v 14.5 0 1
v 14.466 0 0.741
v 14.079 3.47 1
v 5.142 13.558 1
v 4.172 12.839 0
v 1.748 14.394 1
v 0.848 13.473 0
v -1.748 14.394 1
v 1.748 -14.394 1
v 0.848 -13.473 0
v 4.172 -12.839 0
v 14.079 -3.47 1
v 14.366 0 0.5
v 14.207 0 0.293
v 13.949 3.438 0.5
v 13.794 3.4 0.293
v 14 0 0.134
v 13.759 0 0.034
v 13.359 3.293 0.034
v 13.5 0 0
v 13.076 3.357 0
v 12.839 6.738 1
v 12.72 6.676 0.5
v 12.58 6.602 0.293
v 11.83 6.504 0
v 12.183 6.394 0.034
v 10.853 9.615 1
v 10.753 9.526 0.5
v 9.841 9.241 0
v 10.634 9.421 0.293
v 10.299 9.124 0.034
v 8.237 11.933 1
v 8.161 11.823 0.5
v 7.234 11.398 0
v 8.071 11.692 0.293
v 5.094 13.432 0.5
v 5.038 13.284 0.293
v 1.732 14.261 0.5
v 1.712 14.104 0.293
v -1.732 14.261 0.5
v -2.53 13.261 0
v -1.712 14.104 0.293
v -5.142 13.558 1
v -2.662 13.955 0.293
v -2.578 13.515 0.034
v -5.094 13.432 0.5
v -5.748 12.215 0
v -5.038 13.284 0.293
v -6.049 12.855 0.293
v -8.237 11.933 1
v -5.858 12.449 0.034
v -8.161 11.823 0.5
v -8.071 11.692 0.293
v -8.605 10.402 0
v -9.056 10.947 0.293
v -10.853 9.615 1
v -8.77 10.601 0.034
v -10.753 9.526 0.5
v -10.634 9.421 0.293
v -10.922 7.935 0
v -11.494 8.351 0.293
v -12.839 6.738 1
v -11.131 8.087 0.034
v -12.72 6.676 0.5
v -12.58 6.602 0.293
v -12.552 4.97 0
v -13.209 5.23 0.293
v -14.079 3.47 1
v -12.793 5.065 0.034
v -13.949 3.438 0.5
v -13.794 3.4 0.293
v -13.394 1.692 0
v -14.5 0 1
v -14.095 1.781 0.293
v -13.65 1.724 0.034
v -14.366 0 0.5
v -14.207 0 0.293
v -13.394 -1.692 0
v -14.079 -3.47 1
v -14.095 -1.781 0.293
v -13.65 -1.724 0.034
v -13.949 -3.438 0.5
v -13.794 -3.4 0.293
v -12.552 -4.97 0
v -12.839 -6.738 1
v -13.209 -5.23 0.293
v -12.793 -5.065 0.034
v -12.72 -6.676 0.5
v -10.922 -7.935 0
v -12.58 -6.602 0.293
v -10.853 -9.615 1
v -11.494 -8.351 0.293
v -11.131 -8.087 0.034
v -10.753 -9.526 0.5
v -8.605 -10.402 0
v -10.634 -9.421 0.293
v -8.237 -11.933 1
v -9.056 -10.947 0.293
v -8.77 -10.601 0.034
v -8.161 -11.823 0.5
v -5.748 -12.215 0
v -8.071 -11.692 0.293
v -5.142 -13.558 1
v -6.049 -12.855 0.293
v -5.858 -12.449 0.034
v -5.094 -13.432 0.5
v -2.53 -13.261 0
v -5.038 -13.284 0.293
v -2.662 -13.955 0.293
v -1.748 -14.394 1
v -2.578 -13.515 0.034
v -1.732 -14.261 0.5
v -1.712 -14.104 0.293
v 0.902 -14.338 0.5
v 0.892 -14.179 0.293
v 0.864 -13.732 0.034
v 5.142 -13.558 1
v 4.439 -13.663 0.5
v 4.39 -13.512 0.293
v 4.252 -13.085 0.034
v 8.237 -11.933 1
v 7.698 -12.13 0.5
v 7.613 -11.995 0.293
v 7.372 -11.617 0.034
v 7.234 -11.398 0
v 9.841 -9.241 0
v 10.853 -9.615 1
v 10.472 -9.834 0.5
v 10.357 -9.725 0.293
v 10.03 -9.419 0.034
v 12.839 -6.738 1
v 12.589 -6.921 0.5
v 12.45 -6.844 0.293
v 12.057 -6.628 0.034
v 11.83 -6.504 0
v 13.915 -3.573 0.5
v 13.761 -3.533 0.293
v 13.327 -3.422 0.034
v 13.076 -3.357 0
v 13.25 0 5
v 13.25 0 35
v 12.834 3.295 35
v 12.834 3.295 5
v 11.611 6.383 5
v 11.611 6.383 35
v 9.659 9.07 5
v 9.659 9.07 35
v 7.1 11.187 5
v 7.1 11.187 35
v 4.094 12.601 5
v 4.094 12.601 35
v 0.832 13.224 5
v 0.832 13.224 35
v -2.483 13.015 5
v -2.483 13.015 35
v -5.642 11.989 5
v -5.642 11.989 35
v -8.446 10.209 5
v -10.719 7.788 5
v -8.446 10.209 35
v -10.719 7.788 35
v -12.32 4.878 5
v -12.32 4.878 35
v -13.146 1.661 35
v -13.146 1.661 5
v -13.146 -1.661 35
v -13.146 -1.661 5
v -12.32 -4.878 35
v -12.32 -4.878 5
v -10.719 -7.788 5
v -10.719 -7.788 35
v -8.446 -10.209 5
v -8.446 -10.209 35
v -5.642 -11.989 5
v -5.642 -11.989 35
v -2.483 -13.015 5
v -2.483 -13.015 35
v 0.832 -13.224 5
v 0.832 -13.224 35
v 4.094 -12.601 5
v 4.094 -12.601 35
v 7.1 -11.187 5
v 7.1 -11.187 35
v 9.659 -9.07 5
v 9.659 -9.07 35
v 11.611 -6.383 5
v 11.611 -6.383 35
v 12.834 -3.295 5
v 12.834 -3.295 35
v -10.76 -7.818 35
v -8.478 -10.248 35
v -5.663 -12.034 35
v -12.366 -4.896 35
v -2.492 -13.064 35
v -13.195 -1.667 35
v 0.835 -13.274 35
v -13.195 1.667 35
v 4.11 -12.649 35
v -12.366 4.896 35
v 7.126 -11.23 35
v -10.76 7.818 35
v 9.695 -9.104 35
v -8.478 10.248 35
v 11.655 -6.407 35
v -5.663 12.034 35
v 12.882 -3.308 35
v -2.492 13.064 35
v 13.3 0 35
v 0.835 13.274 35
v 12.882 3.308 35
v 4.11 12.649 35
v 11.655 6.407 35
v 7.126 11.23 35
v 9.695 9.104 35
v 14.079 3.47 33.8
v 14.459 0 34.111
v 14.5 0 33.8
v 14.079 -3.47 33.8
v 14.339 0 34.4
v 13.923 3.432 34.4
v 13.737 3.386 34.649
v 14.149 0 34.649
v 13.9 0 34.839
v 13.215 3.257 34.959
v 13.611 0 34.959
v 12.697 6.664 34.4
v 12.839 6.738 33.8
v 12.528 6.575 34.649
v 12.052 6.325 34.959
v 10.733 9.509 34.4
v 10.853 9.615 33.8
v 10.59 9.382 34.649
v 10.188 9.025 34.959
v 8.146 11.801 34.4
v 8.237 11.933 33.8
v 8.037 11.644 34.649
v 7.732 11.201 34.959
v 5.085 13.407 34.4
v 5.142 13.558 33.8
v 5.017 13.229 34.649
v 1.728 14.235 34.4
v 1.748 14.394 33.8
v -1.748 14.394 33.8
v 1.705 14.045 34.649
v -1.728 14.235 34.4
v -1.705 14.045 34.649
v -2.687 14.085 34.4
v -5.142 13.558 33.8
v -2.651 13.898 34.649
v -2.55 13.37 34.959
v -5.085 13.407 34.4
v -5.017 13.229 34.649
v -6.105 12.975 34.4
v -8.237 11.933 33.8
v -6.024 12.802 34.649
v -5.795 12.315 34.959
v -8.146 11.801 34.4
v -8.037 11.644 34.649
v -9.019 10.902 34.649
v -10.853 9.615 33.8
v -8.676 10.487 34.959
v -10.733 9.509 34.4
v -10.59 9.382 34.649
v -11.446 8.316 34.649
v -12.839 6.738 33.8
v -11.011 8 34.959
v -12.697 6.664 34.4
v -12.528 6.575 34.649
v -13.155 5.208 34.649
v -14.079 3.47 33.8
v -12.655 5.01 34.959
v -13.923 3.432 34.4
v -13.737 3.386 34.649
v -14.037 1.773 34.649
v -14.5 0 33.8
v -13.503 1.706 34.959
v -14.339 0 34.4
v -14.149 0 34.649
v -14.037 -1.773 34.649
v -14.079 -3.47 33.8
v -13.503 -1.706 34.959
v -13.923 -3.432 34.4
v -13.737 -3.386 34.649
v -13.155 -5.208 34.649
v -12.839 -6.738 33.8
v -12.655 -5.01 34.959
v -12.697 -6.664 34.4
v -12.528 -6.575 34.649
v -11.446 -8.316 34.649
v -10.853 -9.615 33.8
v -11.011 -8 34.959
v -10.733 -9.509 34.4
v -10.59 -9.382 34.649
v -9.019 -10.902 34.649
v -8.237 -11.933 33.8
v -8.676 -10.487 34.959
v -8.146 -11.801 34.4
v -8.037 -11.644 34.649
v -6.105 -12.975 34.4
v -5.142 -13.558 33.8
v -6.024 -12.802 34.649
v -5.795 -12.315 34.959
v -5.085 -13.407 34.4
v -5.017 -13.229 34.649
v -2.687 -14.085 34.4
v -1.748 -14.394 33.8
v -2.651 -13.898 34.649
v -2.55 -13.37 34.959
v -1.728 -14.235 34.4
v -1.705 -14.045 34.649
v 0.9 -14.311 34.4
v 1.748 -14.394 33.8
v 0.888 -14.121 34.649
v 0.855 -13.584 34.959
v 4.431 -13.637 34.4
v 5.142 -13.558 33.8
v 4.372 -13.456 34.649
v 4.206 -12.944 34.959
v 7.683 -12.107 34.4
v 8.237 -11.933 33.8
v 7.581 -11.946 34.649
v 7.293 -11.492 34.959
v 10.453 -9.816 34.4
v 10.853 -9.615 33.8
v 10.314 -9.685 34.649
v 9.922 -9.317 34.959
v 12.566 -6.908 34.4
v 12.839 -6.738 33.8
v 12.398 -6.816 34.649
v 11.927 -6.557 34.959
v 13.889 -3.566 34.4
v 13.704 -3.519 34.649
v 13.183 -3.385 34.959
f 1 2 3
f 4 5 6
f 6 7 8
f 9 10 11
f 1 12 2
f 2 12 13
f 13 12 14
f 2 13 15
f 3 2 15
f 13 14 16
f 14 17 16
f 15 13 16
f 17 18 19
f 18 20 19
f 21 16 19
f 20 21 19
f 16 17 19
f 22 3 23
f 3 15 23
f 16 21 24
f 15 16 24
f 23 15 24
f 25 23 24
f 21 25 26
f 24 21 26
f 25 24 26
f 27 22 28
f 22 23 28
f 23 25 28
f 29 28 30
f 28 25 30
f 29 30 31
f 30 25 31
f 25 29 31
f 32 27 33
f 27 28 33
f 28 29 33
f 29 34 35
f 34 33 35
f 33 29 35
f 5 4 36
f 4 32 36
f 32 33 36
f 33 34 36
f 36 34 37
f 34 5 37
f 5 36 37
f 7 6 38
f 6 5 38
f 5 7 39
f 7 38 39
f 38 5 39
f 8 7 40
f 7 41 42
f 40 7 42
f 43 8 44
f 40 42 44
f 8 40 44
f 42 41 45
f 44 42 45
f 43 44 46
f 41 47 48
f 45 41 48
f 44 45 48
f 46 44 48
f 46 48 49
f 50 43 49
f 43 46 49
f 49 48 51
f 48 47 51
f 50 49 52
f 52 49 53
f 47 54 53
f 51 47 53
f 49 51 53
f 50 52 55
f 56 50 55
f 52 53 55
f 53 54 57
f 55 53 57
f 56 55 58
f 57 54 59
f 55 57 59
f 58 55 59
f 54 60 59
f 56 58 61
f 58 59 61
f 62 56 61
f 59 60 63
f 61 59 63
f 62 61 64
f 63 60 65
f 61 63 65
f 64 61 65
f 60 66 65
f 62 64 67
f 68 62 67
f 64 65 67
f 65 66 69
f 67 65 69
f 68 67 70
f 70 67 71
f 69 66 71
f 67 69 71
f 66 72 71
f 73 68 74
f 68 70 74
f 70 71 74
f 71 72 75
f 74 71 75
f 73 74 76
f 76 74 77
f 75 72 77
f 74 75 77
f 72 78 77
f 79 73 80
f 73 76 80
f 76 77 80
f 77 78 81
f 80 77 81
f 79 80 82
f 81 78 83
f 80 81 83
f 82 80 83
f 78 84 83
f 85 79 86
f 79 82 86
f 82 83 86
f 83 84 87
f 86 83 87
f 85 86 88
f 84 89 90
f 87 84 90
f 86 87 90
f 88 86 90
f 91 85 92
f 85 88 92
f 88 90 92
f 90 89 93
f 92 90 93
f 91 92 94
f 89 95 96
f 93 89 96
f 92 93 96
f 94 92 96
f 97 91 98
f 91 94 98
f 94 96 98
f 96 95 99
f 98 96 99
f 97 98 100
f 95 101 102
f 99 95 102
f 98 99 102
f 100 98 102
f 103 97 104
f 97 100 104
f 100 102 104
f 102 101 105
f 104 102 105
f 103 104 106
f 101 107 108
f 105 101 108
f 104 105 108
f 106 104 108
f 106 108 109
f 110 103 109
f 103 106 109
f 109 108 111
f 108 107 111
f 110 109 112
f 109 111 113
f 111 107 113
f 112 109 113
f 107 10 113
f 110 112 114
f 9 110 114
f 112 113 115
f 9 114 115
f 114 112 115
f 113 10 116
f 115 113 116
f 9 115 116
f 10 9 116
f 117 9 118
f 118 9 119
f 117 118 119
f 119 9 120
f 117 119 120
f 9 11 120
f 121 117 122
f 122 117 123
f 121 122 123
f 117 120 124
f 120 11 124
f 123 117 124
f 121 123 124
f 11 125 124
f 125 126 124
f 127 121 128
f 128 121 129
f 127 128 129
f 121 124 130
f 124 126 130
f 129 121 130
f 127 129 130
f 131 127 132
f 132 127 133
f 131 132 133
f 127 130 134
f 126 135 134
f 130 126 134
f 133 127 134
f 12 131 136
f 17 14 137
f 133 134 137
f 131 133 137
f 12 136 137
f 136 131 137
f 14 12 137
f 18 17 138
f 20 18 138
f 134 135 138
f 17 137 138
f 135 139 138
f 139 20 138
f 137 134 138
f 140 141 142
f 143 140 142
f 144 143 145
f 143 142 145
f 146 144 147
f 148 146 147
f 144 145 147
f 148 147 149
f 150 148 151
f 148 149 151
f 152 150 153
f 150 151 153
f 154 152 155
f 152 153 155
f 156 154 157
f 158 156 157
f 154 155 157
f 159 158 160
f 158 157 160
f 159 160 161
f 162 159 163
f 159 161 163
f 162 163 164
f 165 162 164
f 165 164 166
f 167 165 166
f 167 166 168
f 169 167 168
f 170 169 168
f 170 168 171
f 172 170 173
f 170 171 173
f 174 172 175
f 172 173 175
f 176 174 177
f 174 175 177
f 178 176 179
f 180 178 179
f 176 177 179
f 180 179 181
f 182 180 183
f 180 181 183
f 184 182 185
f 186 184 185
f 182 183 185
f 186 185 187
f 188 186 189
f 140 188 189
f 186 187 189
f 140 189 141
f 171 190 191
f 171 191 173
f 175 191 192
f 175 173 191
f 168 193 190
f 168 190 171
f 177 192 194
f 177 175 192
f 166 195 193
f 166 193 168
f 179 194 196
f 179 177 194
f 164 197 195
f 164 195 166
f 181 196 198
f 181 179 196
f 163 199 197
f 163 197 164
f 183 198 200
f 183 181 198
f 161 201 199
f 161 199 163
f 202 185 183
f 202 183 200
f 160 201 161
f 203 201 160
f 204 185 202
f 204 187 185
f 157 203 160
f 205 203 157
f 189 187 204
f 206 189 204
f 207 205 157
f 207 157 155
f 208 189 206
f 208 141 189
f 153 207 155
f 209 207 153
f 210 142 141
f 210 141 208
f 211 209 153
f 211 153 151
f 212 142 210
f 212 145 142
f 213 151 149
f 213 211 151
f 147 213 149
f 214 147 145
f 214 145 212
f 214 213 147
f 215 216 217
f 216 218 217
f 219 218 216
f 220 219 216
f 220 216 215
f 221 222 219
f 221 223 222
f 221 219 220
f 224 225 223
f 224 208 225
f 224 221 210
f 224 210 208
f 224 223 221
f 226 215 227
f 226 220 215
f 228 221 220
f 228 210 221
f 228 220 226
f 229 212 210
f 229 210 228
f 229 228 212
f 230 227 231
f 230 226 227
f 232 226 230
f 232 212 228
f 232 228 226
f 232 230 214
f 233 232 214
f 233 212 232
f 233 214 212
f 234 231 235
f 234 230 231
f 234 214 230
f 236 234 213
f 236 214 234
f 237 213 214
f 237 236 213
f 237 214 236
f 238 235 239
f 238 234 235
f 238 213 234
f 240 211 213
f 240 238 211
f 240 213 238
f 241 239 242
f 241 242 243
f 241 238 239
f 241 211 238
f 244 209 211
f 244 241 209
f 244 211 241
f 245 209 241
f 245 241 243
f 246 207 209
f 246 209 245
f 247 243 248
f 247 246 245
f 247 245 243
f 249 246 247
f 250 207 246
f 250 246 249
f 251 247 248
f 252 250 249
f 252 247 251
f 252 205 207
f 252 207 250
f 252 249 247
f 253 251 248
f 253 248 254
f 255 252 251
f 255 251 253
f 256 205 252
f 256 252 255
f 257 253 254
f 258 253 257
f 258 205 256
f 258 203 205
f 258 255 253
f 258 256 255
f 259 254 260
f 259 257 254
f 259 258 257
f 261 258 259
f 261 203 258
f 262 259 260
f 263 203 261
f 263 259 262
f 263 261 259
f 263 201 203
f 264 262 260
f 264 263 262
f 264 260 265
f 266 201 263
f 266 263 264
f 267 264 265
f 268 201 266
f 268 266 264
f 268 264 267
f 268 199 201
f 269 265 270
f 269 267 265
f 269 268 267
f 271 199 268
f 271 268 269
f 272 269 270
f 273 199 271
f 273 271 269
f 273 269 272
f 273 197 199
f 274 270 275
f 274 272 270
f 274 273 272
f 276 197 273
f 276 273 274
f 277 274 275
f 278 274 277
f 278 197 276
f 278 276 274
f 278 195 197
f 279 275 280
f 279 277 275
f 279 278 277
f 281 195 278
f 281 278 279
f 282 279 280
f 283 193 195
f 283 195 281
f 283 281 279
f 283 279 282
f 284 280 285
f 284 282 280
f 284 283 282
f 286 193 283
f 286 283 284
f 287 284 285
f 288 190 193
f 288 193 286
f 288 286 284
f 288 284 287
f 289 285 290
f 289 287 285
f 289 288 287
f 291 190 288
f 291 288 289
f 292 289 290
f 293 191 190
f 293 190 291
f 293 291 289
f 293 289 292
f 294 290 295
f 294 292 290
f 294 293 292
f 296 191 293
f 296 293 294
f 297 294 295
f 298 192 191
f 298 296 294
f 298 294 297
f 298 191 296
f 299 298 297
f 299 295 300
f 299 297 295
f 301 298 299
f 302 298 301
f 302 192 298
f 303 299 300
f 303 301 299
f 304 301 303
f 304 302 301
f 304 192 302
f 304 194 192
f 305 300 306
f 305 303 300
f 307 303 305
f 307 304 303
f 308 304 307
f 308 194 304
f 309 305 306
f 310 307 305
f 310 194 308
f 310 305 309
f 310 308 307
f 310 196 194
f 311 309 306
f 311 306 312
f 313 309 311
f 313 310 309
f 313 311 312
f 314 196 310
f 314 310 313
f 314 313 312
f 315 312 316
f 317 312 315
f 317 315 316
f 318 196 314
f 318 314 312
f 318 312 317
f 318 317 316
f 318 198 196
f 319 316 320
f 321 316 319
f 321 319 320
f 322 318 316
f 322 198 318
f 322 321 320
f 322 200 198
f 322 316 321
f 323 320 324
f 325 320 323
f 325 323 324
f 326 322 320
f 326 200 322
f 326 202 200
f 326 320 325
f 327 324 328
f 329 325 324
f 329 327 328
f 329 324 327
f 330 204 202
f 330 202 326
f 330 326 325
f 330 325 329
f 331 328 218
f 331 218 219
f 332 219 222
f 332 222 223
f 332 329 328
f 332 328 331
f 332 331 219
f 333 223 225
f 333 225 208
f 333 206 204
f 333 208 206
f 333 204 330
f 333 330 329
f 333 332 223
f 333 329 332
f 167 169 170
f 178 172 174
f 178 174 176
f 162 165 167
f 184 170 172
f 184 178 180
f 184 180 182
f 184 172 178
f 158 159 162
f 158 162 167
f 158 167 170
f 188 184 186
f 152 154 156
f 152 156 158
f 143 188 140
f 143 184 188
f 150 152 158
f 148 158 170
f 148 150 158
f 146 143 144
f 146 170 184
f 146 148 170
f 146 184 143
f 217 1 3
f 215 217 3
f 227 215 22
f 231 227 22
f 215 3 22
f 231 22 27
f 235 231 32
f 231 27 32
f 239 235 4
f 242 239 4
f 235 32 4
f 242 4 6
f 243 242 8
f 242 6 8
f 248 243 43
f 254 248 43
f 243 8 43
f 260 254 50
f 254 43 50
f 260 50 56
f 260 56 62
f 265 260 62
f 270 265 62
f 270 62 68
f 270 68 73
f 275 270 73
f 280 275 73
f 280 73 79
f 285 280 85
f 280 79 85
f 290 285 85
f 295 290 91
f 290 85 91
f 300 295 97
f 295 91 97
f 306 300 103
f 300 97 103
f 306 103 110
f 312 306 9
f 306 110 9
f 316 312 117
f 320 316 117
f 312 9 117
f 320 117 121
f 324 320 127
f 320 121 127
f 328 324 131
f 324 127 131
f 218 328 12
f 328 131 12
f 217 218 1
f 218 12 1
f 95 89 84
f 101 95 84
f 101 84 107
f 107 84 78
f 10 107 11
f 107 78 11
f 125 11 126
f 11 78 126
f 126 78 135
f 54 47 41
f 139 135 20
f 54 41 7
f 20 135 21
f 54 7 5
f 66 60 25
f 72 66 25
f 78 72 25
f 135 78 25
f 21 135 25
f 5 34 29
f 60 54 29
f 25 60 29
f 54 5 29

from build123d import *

# Parameters (mm, degrees)
SKETCH_R     = 14.5
PAD_DEPTH    = 35
SKETCH001_R  = 13.25
POCKET_DEPTH = 30
FILLET_R     = 1
FILLET001_R  = 1.2


with BuildPart() as part:
    # Sketch → Pad (new body)
    with BuildSketch(Plane.XY):
        Circle(SKETCH_R)
    extrude(amount=PAD_DEPTH)

    # Sketch001 (on Face3 of Pad) → Pocket (cut)
    with BuildSketch(Plane.XY.offset(35)):
        Circle(SKETCH001_R)
    extrude(amount=-POCKET_DEPTH, mode=Mode.SUBTRACT)

    # Fillet
    fillet_edges = [part.edges().sort_by_distance(p)[0] for p in [
        (-14.5, 0, 0),
    ]]
    fillet(fillet_edges, radius=FILLET_R)

    # Fillet001
    fillet001_edges = [part.edges().sort_by_distance(p)[0] for p in [
        (-14.5, 0, 35),
    ]]
    fillet(fillet001_edges, radius=FILLET001_R)


solid = part.part
